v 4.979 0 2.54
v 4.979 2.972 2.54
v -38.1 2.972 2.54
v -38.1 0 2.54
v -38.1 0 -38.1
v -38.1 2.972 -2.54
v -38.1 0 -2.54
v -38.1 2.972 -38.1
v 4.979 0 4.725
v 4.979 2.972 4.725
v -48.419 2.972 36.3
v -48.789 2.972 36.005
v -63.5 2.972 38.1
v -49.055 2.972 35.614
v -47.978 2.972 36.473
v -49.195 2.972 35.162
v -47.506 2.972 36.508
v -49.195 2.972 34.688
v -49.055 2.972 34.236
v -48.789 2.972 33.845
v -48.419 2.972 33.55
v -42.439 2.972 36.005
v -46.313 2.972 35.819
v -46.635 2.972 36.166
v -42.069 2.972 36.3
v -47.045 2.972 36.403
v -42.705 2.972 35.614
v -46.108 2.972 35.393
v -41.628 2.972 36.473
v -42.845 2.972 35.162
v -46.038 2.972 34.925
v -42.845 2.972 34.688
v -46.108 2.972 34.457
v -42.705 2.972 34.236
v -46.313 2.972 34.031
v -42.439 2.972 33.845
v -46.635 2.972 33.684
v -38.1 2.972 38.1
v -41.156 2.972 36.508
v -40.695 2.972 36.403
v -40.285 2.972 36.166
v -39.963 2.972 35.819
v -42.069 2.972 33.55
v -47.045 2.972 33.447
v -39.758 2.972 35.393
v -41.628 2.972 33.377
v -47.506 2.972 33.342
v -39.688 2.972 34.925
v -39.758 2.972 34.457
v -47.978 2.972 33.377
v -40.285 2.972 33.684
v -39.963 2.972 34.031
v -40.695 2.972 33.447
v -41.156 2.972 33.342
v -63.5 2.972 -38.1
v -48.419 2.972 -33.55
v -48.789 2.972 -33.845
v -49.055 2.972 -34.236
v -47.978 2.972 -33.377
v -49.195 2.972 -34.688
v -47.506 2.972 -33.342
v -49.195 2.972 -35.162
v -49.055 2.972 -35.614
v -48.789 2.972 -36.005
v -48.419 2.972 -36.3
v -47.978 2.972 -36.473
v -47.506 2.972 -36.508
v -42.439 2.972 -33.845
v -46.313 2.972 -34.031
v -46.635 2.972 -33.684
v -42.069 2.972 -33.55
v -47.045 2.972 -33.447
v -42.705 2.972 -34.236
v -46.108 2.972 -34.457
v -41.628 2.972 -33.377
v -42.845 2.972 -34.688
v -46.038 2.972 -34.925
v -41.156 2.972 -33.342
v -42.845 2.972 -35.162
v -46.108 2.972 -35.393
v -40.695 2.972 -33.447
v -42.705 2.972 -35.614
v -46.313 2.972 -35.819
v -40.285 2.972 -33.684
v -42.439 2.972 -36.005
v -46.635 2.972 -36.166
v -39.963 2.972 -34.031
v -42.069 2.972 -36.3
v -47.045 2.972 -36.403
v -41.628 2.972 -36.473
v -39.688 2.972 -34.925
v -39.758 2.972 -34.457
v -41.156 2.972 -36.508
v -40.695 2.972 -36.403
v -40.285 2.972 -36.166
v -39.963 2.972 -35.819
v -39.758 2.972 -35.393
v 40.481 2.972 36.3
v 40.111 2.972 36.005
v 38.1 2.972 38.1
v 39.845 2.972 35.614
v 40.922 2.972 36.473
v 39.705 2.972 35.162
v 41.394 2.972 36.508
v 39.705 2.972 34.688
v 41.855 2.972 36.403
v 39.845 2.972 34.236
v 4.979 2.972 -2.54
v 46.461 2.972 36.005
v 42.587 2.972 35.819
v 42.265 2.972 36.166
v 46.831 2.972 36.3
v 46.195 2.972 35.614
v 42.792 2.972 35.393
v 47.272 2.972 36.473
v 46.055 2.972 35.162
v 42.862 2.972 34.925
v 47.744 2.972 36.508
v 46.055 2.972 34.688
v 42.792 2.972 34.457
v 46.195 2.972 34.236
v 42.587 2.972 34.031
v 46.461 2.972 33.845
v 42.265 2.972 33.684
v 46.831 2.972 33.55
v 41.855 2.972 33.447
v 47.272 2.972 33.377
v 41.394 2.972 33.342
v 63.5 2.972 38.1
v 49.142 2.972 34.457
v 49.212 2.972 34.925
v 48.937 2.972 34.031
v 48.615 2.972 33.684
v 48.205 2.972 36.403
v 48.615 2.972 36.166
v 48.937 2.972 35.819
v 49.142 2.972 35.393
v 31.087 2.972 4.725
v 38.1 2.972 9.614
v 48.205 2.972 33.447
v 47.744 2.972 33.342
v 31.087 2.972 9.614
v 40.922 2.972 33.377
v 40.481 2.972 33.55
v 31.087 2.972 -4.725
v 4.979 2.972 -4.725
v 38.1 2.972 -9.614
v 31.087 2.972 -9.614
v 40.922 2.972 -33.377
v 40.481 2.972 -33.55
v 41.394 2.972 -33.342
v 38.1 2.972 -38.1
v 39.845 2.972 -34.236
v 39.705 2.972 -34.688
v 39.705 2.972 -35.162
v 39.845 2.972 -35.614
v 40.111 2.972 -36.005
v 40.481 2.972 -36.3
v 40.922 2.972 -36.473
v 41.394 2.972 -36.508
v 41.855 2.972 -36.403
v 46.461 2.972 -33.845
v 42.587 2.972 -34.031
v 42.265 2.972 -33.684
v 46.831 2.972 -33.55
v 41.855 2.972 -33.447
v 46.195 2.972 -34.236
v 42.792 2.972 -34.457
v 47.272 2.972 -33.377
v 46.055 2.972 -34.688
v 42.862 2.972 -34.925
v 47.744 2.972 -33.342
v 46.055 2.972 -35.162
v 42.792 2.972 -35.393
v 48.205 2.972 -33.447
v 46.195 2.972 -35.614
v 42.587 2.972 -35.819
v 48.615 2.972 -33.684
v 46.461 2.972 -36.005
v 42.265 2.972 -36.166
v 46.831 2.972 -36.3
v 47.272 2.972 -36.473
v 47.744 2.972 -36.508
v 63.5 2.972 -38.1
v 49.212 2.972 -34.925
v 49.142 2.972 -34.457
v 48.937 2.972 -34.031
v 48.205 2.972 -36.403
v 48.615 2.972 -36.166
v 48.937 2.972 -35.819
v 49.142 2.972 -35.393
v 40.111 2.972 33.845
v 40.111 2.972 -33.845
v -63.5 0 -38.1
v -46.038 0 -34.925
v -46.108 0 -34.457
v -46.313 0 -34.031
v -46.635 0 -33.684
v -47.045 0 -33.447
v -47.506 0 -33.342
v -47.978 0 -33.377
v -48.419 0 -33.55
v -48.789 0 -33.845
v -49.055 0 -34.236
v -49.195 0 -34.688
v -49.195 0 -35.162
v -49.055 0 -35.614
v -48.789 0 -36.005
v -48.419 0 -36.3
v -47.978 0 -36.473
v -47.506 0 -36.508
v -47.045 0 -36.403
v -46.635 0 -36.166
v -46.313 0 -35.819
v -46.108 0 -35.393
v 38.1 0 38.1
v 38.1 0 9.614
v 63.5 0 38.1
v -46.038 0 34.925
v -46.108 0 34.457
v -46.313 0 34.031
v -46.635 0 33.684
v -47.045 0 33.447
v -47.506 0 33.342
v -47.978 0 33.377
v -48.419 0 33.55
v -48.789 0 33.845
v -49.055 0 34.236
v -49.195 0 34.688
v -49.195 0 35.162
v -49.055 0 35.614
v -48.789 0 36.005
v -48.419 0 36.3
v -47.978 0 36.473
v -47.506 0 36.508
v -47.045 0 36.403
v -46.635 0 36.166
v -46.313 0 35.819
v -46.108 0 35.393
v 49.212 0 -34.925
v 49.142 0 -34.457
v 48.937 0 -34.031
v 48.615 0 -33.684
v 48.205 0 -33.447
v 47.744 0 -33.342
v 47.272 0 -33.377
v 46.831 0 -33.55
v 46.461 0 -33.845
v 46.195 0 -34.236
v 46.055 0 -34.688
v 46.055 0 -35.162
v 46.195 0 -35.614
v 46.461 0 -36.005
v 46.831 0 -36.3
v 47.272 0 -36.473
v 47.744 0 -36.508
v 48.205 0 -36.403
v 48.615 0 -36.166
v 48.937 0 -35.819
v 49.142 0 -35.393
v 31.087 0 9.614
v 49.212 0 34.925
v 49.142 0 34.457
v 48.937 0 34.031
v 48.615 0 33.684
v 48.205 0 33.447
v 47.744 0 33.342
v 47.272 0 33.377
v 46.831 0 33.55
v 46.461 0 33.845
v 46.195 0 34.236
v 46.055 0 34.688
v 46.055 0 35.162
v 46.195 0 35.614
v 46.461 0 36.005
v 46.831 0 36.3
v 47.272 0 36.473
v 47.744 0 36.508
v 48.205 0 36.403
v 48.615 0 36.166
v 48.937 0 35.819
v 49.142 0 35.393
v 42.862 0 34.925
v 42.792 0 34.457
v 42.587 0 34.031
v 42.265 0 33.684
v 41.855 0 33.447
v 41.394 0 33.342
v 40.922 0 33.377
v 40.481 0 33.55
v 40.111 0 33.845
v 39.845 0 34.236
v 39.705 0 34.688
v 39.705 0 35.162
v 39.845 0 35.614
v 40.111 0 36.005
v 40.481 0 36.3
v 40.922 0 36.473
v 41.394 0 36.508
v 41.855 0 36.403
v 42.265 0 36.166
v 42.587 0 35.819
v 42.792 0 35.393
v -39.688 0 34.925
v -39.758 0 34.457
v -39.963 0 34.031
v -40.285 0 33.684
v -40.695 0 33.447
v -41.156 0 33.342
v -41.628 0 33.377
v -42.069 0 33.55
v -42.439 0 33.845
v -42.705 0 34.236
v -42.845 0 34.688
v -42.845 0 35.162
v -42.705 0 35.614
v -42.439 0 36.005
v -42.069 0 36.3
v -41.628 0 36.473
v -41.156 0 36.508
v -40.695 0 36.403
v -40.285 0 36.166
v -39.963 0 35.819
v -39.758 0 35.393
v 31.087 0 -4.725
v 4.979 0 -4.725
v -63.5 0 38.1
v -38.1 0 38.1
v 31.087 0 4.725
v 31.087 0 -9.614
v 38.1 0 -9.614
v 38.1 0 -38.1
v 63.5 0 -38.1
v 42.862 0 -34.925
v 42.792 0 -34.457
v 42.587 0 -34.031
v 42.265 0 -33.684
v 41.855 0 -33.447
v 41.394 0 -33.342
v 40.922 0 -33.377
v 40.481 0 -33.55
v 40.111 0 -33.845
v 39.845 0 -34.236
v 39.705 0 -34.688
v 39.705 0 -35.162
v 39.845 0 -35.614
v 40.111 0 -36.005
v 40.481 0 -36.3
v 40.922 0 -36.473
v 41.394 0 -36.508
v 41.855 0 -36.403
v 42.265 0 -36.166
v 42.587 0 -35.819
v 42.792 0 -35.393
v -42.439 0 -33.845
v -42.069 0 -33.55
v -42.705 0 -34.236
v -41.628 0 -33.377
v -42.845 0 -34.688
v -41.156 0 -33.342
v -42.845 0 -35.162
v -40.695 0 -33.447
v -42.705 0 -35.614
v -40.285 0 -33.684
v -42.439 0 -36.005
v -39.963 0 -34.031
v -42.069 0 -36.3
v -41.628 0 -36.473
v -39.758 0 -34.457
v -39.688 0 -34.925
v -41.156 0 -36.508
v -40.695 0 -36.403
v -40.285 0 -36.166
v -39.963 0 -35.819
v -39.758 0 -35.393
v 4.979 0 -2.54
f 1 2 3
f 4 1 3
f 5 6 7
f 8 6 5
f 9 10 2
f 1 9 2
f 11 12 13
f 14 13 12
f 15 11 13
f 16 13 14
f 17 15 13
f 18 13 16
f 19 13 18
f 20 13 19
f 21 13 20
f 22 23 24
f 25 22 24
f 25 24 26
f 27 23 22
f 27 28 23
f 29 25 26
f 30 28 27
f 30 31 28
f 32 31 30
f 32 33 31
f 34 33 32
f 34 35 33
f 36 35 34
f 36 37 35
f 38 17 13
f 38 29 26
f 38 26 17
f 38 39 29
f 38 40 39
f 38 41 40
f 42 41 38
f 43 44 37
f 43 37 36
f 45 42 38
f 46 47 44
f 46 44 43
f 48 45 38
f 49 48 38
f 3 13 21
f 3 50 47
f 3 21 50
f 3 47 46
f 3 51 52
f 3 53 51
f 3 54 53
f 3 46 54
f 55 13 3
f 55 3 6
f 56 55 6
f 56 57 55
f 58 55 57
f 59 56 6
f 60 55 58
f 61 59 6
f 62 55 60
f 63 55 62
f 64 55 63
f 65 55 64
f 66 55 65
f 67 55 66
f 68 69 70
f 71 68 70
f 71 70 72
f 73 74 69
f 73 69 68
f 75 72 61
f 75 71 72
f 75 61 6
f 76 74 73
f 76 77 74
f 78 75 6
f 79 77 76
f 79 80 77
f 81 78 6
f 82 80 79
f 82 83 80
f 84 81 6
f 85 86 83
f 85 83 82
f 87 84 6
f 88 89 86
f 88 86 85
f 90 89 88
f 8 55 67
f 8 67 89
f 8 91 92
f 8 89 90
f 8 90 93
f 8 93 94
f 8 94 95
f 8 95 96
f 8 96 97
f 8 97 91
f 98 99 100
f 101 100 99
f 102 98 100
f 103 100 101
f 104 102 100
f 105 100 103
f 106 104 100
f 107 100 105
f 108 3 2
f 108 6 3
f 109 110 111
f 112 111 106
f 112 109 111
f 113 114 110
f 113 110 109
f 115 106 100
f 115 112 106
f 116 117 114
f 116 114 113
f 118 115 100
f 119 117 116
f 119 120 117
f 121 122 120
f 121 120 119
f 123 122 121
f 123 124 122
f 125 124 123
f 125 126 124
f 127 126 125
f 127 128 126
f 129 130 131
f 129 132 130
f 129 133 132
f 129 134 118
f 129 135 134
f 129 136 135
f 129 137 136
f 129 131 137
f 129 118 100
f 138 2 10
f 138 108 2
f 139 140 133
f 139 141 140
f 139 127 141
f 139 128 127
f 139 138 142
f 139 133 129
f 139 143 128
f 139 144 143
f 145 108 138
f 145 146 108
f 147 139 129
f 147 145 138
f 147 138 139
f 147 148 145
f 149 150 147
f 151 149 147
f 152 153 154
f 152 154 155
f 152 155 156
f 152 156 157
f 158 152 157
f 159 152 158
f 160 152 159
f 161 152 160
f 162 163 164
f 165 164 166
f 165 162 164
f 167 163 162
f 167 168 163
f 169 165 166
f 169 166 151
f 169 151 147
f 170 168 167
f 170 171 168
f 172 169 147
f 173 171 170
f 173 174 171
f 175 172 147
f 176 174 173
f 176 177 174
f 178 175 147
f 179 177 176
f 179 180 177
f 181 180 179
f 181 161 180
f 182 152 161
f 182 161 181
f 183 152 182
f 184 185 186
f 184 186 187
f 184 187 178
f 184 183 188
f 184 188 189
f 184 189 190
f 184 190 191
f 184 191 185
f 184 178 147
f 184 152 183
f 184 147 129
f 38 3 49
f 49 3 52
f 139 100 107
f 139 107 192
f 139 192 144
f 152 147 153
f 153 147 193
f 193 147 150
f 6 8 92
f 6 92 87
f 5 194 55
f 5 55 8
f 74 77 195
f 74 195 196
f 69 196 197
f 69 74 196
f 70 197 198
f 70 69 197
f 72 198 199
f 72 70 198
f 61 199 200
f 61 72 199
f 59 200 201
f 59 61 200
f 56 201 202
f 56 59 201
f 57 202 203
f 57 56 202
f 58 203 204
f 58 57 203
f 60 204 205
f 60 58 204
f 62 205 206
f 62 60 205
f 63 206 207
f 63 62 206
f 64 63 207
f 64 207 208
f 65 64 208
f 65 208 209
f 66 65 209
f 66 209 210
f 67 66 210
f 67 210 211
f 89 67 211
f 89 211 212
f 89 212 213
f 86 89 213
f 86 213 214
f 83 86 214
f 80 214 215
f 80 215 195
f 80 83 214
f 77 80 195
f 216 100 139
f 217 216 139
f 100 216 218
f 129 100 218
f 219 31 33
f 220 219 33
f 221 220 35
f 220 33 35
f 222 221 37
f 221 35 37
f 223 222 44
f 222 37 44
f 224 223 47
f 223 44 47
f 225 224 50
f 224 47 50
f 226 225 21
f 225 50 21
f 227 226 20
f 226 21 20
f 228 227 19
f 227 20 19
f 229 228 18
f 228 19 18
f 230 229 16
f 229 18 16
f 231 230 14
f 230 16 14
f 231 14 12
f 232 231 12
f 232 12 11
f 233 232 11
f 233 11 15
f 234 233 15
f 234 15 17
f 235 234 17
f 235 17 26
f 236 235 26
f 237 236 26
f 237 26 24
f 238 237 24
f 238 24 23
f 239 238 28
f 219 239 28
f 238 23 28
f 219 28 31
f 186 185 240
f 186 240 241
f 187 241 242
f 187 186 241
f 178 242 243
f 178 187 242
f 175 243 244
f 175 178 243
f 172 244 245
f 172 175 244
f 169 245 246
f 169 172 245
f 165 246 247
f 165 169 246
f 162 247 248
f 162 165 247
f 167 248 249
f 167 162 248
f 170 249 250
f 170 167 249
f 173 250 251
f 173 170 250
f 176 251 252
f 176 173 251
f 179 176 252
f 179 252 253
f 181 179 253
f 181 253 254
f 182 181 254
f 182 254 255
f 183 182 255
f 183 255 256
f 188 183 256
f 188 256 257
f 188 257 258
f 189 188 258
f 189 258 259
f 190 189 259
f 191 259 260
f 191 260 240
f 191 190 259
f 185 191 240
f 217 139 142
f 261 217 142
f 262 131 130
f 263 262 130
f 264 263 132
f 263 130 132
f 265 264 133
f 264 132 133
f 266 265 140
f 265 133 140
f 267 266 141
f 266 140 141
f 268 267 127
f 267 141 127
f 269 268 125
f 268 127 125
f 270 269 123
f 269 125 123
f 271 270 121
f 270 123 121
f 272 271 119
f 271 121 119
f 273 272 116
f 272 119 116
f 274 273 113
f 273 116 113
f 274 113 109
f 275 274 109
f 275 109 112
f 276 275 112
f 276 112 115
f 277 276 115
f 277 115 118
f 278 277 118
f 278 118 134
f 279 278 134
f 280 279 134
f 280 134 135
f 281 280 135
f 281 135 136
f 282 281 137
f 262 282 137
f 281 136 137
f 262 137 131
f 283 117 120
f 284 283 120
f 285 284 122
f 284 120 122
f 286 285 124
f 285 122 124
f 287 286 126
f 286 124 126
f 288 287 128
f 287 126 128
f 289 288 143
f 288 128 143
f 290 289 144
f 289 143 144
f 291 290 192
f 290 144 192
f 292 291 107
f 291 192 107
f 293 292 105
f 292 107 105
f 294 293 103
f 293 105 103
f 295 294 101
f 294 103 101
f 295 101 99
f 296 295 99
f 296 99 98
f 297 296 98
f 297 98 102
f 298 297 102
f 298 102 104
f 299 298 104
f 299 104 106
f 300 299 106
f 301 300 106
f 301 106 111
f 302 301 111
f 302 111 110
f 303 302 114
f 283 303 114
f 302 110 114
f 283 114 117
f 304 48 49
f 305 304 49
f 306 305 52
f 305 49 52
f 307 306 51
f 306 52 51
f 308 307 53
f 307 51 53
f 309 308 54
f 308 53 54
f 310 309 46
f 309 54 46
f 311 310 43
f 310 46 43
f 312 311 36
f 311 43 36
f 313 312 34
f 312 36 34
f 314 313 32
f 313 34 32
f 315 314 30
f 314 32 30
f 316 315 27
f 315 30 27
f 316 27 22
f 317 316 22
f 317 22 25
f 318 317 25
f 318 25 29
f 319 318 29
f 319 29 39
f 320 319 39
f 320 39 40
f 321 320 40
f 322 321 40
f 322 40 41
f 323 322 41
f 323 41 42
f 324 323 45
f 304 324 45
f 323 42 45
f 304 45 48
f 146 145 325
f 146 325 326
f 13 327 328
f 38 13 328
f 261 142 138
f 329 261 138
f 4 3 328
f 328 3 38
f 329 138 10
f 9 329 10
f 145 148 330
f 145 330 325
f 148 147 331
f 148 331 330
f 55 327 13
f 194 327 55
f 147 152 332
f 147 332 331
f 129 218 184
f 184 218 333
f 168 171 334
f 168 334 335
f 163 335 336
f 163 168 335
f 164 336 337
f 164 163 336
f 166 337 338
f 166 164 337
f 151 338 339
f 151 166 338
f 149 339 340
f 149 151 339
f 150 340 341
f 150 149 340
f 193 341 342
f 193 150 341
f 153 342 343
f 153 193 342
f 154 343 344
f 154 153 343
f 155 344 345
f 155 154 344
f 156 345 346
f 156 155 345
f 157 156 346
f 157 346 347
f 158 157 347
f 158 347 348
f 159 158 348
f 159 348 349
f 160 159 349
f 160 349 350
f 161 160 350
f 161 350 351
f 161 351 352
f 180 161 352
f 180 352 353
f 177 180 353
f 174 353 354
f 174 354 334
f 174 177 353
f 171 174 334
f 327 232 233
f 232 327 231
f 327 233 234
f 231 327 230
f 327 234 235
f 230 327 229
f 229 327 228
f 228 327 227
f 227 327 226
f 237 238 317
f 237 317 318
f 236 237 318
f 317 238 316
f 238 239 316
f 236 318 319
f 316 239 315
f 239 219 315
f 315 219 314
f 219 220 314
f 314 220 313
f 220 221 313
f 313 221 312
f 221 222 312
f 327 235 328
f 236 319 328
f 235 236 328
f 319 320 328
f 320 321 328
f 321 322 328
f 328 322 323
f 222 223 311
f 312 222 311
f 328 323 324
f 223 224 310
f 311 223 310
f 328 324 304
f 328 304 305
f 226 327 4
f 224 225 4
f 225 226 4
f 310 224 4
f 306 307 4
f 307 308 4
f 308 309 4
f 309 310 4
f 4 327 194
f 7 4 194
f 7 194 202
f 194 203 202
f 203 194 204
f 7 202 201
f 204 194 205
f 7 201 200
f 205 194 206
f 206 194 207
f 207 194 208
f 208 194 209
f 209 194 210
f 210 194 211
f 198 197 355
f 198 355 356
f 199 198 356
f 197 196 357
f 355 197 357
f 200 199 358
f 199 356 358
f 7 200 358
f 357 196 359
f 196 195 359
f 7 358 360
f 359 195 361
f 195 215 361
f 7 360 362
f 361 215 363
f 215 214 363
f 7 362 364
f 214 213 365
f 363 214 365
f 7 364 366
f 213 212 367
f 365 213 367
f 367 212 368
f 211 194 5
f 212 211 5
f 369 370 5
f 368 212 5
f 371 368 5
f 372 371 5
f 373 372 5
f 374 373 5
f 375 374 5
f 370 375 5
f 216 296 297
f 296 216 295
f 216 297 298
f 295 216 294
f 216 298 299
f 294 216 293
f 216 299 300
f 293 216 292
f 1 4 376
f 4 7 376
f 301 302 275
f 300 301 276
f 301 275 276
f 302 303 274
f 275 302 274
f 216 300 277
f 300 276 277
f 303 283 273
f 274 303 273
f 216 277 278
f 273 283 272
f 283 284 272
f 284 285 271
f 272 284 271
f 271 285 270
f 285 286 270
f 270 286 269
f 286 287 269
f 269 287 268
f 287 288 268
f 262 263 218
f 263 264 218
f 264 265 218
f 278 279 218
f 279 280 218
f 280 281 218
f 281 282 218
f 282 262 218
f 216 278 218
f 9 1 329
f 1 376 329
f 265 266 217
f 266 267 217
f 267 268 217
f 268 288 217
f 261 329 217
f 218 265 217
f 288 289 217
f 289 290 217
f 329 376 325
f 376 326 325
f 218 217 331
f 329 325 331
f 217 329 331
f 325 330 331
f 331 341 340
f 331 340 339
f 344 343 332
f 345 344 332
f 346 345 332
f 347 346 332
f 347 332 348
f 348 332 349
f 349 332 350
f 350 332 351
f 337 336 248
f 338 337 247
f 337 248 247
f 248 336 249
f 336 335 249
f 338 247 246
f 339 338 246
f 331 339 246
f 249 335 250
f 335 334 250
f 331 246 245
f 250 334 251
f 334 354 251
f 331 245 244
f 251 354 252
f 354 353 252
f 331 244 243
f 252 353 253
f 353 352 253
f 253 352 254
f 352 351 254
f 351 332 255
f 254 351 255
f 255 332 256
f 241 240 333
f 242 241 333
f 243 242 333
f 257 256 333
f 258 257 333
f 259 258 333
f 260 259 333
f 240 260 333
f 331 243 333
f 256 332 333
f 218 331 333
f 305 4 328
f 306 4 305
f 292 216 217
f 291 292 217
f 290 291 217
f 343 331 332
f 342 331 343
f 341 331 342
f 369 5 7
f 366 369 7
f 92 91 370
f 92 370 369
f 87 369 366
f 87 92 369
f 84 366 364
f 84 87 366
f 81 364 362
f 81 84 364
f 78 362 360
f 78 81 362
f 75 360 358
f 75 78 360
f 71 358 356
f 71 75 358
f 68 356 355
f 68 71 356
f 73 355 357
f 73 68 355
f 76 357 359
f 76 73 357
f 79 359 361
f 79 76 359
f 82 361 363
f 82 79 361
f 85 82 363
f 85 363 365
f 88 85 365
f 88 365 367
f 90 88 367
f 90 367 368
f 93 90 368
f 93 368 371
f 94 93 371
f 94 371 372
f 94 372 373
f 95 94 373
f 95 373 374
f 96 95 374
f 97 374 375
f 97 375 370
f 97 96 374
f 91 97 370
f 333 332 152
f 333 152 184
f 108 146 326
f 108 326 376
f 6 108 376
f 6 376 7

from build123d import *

# Parameters (mm, degrees)
SKETCH2_W           = 127
SKETCH2_H           = 76.2
BOSS_EXTRUDE1_DEPTH = 2.9718
SKETCH3_R           = 1.5875
CUT_EXTRUDE1_DEPTH  = 2.9718


with BuildPart() as part:
    # Sketch2 → Boss-Extrude1 (new body)
    with BuildSketch(Plane(origin=(0, 0, 0), x_dir=(1, 0, 0), z_dir=(0, 1, 0))):
        Rectangle(SKETCH2_W, SKETCH2_H)
    extrude(amount=BOSS_EXTRUDE1_DEPTH)

    # Sketch3 → Cut-Extrude1 (cut)
    with BuildSketch(Plane(origin=(0, 2.9718, 0), x_dir=(1, 0, 0), z_dir=(0, 1, 0))):
        Polygon((4.978749596, -4.724789245), (4.978749596, -2.54), (-38.1, -2.54), (-38.1, -38.1), (38.1, -38.1), (38.1, -9.614135395), (31.086734384, -9.614135395), (31.086734384, -4.724789245), align=None)
        with Locations((41.275, -34.925)):
            Circle(SKETCH3_R)
        with Locations((47.625, -34.925)):
            Circle(SKETCH3_R)
        with Locations((-41.275, -34.925)):
            Circle(SKETCH3_R)
        with Locations((-47.625, -34.925)):
            Circle(SKETCH3_R)
    cut_extrude1 = extrude(amount=-CUT_EXTRUDE1_DEPTH, mode=Mode.SUBTRACT)

    # Mirror1: Cut-Extrude1 across plane
    add(cut_extrude1.mirror(Plane.XY), mode=Mode.SUBTRACT)


solid = part.part
